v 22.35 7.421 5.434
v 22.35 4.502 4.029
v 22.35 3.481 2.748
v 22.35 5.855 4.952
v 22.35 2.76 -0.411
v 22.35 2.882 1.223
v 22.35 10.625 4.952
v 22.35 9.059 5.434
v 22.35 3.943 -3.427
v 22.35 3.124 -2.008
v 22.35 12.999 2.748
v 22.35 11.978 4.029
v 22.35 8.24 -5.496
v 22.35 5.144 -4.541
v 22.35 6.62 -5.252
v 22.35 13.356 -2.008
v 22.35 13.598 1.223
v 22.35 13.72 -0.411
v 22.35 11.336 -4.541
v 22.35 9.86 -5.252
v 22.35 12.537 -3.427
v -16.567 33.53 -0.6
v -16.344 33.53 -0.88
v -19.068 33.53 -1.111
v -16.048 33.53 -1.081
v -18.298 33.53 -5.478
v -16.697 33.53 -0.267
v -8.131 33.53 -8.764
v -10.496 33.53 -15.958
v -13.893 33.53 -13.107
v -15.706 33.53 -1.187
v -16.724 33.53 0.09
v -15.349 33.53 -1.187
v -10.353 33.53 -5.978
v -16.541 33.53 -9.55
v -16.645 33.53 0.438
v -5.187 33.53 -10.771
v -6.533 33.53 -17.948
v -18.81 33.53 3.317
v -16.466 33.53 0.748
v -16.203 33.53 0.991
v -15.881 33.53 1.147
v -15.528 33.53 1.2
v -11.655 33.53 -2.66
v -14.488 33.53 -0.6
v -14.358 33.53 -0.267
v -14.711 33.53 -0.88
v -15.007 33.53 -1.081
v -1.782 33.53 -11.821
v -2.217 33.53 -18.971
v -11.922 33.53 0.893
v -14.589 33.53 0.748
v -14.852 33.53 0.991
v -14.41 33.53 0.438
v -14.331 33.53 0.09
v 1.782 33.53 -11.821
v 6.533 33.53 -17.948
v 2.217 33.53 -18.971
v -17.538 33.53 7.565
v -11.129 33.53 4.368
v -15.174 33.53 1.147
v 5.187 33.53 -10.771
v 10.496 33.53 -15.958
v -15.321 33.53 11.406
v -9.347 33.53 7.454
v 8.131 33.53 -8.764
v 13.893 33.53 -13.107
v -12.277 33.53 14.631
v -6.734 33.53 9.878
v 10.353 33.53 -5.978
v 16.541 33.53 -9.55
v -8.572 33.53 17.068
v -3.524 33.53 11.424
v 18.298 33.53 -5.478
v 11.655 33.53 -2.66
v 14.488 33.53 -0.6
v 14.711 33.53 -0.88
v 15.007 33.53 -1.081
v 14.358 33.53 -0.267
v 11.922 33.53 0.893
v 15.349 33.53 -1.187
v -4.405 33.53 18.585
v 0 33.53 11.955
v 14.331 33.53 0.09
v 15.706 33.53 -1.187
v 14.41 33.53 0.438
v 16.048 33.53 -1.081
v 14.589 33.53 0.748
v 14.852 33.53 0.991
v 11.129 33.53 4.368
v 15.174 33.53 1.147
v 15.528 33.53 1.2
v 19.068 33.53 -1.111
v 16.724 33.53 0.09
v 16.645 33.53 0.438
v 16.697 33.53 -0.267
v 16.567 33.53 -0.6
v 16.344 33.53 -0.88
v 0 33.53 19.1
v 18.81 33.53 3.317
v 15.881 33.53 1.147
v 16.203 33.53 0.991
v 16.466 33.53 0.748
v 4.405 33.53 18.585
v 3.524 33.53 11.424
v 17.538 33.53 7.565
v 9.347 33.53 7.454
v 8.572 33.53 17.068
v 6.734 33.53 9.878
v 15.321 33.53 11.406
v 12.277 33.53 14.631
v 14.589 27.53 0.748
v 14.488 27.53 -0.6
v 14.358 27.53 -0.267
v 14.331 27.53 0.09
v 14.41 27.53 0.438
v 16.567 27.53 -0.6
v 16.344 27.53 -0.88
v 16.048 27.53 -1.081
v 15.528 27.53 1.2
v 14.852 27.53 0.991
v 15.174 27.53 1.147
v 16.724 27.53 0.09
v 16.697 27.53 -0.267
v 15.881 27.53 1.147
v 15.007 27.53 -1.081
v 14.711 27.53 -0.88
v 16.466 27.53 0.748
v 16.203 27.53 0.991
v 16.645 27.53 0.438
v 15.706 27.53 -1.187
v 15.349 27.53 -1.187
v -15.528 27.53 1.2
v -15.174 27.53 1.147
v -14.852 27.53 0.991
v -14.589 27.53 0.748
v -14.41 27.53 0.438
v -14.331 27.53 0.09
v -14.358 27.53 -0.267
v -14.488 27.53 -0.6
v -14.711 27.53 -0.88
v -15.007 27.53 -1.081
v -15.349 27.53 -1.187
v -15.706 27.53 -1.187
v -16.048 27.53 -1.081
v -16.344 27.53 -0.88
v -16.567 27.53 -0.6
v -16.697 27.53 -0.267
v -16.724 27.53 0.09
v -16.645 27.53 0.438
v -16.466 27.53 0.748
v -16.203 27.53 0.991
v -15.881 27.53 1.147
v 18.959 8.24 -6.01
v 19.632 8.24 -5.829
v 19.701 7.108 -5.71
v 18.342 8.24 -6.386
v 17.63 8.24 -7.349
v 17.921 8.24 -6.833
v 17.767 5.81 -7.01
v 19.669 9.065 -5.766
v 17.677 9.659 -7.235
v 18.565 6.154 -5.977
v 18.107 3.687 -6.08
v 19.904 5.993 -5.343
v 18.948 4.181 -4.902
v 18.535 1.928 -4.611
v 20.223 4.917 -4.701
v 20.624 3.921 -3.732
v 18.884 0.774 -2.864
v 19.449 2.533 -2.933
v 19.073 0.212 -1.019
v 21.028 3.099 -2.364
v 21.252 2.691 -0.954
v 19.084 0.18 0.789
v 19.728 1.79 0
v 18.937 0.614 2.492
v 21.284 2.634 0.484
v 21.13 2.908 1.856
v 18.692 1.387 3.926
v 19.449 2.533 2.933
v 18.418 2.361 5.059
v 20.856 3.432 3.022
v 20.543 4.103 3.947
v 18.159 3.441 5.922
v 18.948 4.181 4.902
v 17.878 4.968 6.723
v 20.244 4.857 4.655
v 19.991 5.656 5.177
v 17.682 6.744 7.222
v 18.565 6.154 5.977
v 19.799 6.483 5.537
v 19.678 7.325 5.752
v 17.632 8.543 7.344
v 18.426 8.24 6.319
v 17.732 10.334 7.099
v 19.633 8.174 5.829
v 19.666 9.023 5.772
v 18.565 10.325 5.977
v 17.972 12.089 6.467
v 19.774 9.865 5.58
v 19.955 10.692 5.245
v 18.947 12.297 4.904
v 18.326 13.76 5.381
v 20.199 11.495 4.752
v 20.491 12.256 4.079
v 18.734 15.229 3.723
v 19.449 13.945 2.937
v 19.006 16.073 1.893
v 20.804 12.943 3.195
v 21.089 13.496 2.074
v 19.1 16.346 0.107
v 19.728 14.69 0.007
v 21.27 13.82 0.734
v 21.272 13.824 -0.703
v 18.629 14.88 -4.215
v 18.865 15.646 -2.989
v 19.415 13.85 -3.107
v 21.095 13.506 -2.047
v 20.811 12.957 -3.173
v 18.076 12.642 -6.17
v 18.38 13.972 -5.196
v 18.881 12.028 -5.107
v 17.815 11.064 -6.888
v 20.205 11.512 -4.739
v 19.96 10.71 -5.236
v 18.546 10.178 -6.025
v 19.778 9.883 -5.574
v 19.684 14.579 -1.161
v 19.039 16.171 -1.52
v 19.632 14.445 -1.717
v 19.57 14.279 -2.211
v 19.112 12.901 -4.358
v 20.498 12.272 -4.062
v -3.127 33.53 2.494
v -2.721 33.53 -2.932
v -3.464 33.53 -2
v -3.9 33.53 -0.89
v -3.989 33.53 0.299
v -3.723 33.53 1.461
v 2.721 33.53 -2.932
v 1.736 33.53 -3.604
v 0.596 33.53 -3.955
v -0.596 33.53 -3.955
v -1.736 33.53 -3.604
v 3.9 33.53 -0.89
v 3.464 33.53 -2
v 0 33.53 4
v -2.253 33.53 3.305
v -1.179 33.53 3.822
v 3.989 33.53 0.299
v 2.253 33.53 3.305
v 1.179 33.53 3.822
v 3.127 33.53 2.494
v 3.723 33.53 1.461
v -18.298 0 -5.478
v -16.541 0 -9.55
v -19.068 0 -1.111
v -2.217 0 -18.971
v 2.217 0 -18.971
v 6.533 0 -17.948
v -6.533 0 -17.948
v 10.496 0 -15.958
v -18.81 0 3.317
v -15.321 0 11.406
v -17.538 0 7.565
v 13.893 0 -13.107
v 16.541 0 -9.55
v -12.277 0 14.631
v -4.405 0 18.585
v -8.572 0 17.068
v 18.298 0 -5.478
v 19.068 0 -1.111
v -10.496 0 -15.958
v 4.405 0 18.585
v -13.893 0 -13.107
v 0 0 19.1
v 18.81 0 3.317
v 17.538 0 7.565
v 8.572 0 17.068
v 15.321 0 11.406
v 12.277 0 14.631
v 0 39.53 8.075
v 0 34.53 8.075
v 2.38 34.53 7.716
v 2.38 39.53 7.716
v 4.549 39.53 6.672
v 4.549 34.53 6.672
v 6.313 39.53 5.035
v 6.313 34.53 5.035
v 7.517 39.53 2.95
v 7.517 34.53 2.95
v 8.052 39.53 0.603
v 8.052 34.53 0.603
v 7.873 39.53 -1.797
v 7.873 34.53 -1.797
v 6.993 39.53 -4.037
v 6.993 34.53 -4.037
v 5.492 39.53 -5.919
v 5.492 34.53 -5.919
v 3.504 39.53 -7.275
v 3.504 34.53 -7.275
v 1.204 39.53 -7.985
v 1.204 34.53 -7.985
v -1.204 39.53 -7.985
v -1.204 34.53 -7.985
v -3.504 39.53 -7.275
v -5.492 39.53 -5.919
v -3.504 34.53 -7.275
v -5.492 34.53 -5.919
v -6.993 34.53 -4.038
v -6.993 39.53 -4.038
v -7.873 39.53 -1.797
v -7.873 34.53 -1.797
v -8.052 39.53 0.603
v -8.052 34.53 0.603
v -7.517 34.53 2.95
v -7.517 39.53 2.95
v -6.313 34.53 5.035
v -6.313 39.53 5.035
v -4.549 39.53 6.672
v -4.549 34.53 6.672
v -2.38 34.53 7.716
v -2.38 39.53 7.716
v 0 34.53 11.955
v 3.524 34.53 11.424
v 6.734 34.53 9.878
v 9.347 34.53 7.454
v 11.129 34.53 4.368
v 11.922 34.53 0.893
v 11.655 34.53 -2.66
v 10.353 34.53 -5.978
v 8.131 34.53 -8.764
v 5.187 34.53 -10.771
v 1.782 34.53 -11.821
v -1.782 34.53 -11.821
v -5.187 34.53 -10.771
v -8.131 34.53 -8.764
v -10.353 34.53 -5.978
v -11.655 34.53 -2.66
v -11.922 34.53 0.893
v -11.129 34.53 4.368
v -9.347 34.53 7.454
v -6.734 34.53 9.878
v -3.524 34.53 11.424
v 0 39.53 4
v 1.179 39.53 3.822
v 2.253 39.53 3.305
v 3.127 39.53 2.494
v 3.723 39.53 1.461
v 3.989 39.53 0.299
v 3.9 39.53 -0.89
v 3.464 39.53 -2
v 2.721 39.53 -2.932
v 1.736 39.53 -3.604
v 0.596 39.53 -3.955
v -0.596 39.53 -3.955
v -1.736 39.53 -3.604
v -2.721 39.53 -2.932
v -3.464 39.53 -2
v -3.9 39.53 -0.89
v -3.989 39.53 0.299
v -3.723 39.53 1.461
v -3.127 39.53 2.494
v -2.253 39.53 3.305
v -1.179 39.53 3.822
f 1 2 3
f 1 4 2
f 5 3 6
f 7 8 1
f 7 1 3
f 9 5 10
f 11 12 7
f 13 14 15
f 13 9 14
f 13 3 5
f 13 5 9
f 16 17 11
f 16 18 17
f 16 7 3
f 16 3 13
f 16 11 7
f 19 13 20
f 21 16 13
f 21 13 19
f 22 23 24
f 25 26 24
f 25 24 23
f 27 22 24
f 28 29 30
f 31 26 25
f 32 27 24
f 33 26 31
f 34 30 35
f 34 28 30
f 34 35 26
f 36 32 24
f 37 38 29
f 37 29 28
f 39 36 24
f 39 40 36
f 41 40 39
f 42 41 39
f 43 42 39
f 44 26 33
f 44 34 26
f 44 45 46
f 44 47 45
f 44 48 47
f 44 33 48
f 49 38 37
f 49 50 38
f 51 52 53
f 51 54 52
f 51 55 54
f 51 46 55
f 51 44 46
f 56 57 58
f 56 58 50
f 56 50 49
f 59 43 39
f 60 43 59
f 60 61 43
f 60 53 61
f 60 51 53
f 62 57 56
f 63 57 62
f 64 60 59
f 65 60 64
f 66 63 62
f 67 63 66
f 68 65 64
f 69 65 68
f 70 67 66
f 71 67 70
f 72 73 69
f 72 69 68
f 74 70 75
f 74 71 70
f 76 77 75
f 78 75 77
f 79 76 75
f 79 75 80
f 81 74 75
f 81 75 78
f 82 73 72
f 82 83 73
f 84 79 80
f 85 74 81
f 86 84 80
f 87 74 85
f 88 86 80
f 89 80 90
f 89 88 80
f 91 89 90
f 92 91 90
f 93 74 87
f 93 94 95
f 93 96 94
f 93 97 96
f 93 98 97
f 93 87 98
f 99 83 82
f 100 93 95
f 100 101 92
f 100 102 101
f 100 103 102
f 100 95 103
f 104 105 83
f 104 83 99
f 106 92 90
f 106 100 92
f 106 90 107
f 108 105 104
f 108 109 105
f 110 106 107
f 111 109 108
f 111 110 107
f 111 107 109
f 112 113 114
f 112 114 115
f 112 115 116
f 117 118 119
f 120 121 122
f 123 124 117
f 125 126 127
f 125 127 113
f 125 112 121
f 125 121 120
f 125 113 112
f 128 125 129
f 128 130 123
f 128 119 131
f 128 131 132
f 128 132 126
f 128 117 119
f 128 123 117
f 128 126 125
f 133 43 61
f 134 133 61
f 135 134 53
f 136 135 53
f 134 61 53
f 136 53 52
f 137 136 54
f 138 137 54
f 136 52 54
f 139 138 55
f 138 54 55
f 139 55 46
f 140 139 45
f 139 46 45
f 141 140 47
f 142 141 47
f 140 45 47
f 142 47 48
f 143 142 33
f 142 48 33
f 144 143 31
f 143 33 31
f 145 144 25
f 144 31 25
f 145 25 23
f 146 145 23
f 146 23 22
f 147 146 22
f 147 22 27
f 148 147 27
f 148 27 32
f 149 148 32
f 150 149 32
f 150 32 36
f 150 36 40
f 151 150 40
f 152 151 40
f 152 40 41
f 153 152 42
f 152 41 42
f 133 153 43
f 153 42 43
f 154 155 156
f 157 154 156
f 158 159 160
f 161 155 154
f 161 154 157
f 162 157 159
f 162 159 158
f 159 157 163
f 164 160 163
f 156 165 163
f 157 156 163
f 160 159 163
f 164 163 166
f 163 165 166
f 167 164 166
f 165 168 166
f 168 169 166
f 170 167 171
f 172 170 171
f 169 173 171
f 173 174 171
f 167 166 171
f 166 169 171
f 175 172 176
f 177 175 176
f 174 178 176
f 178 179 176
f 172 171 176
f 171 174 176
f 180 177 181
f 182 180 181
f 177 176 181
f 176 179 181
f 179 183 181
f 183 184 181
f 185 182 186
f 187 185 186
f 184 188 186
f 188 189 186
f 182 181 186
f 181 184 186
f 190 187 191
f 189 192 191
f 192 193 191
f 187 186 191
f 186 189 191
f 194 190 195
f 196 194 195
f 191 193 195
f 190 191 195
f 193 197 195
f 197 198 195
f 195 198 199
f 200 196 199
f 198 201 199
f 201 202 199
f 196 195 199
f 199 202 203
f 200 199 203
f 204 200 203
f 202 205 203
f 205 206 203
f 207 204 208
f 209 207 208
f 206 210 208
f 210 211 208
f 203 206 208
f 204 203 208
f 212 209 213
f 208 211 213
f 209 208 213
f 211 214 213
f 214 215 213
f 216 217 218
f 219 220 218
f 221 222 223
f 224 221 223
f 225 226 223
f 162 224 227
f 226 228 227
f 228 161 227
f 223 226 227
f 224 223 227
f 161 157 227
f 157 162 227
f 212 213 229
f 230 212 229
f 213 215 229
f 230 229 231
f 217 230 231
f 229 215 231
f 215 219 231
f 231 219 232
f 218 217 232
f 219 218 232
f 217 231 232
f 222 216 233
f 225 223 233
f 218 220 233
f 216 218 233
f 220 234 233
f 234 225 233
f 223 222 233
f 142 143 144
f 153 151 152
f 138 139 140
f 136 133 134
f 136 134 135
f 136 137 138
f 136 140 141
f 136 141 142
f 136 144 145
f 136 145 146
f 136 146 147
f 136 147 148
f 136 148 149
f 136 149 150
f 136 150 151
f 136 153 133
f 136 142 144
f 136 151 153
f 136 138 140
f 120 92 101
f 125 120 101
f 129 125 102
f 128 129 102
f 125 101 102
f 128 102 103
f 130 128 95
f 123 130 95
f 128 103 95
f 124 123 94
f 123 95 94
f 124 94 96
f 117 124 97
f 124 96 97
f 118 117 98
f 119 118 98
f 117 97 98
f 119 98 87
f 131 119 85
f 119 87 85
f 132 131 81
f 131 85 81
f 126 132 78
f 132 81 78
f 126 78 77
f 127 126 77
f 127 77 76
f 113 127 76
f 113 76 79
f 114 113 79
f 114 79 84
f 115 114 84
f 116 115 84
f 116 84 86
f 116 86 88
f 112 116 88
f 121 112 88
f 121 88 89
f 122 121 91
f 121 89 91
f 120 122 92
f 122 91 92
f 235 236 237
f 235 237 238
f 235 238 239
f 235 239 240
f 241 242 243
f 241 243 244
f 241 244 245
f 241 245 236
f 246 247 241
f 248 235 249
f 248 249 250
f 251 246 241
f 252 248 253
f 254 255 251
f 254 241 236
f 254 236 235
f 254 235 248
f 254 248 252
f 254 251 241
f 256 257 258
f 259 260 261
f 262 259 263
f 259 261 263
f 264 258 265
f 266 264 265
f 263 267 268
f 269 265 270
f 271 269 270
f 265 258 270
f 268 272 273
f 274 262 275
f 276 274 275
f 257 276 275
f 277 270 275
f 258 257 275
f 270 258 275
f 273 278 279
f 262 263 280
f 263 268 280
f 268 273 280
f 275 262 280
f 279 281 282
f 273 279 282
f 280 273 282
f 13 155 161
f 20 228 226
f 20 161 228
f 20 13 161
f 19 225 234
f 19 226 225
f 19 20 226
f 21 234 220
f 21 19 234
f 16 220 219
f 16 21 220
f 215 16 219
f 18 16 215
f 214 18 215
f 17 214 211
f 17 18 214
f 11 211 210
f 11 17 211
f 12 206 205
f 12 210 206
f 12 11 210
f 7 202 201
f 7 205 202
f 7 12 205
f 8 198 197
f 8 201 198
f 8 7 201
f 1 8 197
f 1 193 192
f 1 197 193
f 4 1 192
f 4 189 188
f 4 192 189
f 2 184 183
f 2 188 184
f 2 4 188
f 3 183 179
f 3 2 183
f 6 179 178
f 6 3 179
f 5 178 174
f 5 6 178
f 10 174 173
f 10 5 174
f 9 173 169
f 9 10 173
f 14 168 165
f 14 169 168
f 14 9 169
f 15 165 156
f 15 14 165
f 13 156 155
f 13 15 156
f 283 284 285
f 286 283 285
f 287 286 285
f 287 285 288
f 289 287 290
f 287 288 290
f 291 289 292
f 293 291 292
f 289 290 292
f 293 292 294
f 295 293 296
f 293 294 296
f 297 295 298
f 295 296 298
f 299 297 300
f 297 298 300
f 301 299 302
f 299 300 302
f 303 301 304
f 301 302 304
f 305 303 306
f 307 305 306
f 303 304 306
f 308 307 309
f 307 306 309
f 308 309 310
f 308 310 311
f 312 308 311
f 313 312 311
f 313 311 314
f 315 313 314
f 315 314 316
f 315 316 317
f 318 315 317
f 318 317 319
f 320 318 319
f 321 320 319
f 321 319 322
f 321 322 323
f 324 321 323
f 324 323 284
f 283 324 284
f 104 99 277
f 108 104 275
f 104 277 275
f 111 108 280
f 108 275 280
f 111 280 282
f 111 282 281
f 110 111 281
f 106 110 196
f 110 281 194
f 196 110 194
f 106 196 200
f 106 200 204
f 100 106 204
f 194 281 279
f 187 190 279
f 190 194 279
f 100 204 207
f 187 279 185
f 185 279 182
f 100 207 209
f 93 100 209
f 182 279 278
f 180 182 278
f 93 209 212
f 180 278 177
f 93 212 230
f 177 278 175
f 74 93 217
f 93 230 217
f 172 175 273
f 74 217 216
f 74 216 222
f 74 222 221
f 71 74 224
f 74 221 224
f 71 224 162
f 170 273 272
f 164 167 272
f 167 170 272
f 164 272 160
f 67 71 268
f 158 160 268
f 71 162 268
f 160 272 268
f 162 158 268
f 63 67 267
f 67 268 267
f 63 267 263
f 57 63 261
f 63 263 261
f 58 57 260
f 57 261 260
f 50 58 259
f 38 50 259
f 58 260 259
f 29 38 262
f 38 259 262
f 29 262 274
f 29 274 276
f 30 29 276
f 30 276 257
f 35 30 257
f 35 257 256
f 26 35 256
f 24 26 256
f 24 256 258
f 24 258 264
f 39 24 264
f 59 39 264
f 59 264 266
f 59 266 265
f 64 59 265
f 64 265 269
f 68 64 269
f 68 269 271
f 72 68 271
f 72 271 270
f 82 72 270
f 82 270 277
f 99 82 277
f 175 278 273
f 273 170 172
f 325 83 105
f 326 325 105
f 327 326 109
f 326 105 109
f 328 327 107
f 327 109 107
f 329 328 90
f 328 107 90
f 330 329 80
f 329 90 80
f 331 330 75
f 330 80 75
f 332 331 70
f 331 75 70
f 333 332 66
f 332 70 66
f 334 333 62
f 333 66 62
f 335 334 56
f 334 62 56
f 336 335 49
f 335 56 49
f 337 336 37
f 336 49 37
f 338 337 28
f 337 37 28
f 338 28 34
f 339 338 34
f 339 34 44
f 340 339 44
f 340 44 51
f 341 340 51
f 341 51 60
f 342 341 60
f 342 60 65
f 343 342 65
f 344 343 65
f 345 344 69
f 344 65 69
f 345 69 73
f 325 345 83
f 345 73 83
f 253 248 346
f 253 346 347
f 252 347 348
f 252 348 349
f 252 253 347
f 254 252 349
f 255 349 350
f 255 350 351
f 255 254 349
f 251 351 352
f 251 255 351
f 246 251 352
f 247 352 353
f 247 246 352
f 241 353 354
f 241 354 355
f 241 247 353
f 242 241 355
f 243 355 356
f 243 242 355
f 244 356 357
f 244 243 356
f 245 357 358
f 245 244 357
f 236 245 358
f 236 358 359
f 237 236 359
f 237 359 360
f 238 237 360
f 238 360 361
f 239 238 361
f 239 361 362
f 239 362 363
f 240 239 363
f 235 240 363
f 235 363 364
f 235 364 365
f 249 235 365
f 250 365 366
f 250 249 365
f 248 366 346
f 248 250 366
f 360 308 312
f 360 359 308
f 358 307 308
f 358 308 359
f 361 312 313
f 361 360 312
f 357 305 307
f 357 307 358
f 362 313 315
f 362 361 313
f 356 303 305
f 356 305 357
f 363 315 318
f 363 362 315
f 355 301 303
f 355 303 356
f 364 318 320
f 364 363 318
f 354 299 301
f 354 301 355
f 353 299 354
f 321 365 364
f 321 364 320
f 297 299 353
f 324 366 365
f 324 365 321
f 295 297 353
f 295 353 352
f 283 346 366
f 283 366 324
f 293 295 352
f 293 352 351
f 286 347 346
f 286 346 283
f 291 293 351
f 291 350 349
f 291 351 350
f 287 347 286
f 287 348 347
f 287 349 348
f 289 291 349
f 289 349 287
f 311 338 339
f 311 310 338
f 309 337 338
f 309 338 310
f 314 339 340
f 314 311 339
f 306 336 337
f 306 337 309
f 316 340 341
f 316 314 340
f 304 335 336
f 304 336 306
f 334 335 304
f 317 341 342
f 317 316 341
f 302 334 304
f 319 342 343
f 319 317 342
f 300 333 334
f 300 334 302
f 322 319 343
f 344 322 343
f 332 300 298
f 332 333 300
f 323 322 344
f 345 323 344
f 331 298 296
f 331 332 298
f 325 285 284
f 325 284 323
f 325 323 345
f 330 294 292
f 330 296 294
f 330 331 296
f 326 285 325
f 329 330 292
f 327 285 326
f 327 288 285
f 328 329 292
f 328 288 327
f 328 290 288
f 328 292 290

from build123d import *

# Parameters (mm, degrees)
SKETCH2_R           = 19.1
BOSS_EXTRUDE1_DEPTH = 33.53
SKETCH3_R           = 11.955
SKETCH3_R_2         = 8.075
BOSS_EXTRUDE2_DEPTH = 1
SKETCH3_2_R         = 8.075
SKETCH3_2_R_2       = 4
BOSS_EXTRUDE3_DEPTH = 6
SKETCH4_R           = 1.2
CUT_EXTRUDE1_DEPTH  = 6
SKETCH5_R           = 8.24
BOSS_EXTRUDE4_DEPTH = 22.35
BOSS_EXTRUDE4_TAPER = 7
FILLET1_R           = 2.5


with BuildPart() as part:
    # Sketch2 → Boss-Extrude1 (new body)
    with BuildSketch(Plane(origin=(0, 0, 0), x_dir=(1, 0, 0), z_dir=(0, 1, 0))):
        Circle(SKETCH2_R)
    extrude(amount=BOSS_EXTRUDE1_DEPTH)

    # Sketch3 → Boss-Extrude2 (add)
    with BuildSketch(Plane(origin=(0, 33.53, 0), x_dir=(1, 0, 0), z_dir=(0, 1, 0))):
        Circle(SKETCH3_R)
        Circle(SKETCH3_R_2, mode=Mode.SUBTRACT)
    extrude(amount=BOSS_EXTRUDE2_DEPTH)

    # Sketch3<2> → Boss-Extrude3 (add)
    with BuildSketch(Plane(origin=(0, 33.53, 0), x_dir=(1, 0, 0), z_dir=(0, 1, 0))):
        Circle(SKETCH3_2_R)
        Circle(SKETCH3_2_R_2, mode=Mode.SUBTRACT)
    extrude(amount=BOSS_EXTRUDE3_DEPTH)

    # Sketch4 → Cut-Extrude1 (cut)
    with BuildSketch(Plane(origin=(0, 33.53, 0), x_dir=(1, 0, 0), z_dir=(0, 1, 0))):
        with Locations((-15.5275, 0)):
            Circle(SKETCH4_R)
        with Locations((15.5275, 0)):
            Circle(SKETCH4_R)
    extrude(amount=-CUT_EXTRUDE1_DEPTH, mode=Mode.SUBTRACT)

    # Sketch5 → Boss-Extrude4 (add)
    with BuildSketch(Plane(origin=(0, 0, 0), x_dir=(0, 0, -1), z_dir=(1, 0, 0))):
        with Locations((0, 8.24)):
            Circle(SKETCH5_R)
    extrude(amount=BOSS_EXTRUDE4_DEPTH, taper=BOSS_EXTRUDE4_TAPER)

    # Fillet1
    fillet1_edges = [part.edges().sort_by_distance(p)[0] for p in [
        (18.128445003, 8.239999998, 6.014106781),
    ]]
    fillet(fillet1_edges, radius=FILLET1_R)


solid = part.part
